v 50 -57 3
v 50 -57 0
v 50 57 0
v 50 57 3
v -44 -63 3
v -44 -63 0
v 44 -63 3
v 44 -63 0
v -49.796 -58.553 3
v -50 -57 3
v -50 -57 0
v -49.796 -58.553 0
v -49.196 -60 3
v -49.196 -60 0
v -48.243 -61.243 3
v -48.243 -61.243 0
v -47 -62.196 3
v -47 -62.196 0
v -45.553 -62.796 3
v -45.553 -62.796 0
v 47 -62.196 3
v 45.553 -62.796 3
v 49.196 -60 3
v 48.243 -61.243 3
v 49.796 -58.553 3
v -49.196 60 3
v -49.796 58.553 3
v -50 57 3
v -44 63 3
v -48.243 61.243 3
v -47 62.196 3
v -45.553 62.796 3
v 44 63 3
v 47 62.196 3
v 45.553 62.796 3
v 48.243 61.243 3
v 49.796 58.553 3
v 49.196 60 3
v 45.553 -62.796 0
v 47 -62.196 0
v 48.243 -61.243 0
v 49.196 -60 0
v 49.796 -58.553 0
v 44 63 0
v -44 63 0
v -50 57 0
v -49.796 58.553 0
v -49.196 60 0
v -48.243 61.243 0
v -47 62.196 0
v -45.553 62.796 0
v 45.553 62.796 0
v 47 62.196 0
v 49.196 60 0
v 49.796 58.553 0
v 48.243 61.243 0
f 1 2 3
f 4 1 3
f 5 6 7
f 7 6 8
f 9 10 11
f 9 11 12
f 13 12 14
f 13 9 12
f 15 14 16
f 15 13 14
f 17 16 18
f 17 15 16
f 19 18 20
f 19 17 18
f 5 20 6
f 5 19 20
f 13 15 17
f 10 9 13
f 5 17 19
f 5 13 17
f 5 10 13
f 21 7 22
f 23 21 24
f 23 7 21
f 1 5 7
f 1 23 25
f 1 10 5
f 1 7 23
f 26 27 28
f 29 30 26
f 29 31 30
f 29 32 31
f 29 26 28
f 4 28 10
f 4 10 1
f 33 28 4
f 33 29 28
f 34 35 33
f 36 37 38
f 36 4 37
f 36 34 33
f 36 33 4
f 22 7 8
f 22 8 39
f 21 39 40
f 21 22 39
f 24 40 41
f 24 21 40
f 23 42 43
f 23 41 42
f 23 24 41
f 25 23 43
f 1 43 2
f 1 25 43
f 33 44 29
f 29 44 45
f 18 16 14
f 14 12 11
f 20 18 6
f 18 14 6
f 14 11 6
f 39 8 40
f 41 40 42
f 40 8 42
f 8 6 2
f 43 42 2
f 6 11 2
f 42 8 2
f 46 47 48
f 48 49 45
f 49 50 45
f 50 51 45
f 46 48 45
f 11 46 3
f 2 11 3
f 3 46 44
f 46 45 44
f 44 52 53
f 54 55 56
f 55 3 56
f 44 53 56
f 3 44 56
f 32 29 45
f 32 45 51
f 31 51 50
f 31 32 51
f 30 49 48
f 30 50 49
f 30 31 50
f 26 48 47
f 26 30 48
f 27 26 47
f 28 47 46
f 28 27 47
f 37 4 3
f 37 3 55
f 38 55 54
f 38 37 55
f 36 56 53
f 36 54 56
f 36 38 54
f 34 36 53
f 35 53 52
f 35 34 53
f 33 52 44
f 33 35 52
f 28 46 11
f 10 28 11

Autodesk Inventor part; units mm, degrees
ref_plane "YZ Plane" through (0, 0, 0) normal (1, 0, 0) x (0, 1, 0)
ref_plane "XZ Plane" through (0, 0, 0) normal (0, 1, 0) x (-1, 0, 0)
ref_plane "XY Plane" through (0, 0, 0) normal (0, 0, 1) x (1, 0, 0)
sketch "Sketch1" plane through (0, 0, 0) normal (0, 0, 1) x (1, 0, 0)
  line L0 (-50, -63) -> (50, -63)
  line L1 (50, -63) -> (50, 63)
  line L2 (50, 63) -> (-50, 63)
  line L3 (-50, 63) -> (-50, -63)
  line L4 (-50, -63) -> (50, 63) construction
  line L5 (50, -63) -> (-50, 63) construction
  point P0 (0, 0)
  dimension "d0" = 100
  dimension "d1" = 126
extrude "Plate1" add sketch "Sketch1" along normal blind 3
fillet "Corner Round1" radius 6 4 edges at (50, -63, 1.5) (-50, -63, 1.5) (-50, 63, 1.5) (50, 63, 1.5)
equation "\"d2\" = Thickness"
equation "\"BendReliefWidth\" = Thickness"
equation "\"BendReliefDepth\" = 0.5 * Thickness"
equation "\"CornerReliefSize\" = 4 * Thickness"
equation "\"MinimumRemnant\" = 2 * Thickness"
equation "\"TransitionRadius\" = BendRadius"
equation "\"JacobiRadiusSize\" = BendRadius"
equation "\"GapSize\" = Thickness"
equation "\"Thickness\" = 3"
equation "\"BendRadius\" = 5"
properties part number "MSC 820 D-ring plate" material "Stainless Steel"
